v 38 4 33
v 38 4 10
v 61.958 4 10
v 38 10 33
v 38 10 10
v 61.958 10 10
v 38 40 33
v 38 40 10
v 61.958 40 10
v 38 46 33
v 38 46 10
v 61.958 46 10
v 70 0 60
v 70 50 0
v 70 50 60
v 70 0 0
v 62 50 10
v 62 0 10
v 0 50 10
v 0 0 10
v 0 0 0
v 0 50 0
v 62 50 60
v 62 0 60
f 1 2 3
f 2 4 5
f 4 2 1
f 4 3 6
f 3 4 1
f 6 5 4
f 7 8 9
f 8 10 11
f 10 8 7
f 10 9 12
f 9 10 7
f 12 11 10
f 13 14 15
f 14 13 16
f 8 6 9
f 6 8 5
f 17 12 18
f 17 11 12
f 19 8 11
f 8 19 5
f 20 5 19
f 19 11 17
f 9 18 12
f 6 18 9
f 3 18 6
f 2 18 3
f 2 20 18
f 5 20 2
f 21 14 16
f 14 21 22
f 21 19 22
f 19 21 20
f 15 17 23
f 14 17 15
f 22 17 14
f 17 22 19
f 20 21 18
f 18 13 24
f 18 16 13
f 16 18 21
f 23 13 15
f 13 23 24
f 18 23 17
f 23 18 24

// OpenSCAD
$fn = 32;

// ----------------------------------------------------------------------
// Rib bracket: 2-gusset L bracket
// ----------------------------------------------------------------------

// --- parameters (mm) ---
base_l = 70;              // foot length, X
base_w = 50;              // foot width, Y
base_t = 10;              // foot thickness
plate_t = 8;              // upright plate thickness
plate_h = 60;             // overall height
gus_l = 24;               // gusset leg along the foot
gus_h = 24;               // gusset height
gus_t = 6;                // gusset thickness
gus_edge = 4;             // gusset margin from the foot edge
n_gus = 2;                // gusset count

gus_pitch = (base_w - 2 * gus_edge - gus_t) / (n_gus - 1);  // gusset pitch

union() {
  cube([base_l, base_w, base_t]);
  translate([base_l - plate_t, 0, base_t - 1])
    cube([plate_t, base_w, plate_h - base_t + 1]);
  for (i = [0 : n_gus - 1])
    translate([base_l - plate_t - gus_l, gus_edge + i * gus_pitch, base_t - 1])
      rotate([-90, 0, 0])
        linear_extrude(height = gus_t)
          polygon(points = [[0, 0], [gus_l + 1, 0], [0, -gus_h]]);
}
